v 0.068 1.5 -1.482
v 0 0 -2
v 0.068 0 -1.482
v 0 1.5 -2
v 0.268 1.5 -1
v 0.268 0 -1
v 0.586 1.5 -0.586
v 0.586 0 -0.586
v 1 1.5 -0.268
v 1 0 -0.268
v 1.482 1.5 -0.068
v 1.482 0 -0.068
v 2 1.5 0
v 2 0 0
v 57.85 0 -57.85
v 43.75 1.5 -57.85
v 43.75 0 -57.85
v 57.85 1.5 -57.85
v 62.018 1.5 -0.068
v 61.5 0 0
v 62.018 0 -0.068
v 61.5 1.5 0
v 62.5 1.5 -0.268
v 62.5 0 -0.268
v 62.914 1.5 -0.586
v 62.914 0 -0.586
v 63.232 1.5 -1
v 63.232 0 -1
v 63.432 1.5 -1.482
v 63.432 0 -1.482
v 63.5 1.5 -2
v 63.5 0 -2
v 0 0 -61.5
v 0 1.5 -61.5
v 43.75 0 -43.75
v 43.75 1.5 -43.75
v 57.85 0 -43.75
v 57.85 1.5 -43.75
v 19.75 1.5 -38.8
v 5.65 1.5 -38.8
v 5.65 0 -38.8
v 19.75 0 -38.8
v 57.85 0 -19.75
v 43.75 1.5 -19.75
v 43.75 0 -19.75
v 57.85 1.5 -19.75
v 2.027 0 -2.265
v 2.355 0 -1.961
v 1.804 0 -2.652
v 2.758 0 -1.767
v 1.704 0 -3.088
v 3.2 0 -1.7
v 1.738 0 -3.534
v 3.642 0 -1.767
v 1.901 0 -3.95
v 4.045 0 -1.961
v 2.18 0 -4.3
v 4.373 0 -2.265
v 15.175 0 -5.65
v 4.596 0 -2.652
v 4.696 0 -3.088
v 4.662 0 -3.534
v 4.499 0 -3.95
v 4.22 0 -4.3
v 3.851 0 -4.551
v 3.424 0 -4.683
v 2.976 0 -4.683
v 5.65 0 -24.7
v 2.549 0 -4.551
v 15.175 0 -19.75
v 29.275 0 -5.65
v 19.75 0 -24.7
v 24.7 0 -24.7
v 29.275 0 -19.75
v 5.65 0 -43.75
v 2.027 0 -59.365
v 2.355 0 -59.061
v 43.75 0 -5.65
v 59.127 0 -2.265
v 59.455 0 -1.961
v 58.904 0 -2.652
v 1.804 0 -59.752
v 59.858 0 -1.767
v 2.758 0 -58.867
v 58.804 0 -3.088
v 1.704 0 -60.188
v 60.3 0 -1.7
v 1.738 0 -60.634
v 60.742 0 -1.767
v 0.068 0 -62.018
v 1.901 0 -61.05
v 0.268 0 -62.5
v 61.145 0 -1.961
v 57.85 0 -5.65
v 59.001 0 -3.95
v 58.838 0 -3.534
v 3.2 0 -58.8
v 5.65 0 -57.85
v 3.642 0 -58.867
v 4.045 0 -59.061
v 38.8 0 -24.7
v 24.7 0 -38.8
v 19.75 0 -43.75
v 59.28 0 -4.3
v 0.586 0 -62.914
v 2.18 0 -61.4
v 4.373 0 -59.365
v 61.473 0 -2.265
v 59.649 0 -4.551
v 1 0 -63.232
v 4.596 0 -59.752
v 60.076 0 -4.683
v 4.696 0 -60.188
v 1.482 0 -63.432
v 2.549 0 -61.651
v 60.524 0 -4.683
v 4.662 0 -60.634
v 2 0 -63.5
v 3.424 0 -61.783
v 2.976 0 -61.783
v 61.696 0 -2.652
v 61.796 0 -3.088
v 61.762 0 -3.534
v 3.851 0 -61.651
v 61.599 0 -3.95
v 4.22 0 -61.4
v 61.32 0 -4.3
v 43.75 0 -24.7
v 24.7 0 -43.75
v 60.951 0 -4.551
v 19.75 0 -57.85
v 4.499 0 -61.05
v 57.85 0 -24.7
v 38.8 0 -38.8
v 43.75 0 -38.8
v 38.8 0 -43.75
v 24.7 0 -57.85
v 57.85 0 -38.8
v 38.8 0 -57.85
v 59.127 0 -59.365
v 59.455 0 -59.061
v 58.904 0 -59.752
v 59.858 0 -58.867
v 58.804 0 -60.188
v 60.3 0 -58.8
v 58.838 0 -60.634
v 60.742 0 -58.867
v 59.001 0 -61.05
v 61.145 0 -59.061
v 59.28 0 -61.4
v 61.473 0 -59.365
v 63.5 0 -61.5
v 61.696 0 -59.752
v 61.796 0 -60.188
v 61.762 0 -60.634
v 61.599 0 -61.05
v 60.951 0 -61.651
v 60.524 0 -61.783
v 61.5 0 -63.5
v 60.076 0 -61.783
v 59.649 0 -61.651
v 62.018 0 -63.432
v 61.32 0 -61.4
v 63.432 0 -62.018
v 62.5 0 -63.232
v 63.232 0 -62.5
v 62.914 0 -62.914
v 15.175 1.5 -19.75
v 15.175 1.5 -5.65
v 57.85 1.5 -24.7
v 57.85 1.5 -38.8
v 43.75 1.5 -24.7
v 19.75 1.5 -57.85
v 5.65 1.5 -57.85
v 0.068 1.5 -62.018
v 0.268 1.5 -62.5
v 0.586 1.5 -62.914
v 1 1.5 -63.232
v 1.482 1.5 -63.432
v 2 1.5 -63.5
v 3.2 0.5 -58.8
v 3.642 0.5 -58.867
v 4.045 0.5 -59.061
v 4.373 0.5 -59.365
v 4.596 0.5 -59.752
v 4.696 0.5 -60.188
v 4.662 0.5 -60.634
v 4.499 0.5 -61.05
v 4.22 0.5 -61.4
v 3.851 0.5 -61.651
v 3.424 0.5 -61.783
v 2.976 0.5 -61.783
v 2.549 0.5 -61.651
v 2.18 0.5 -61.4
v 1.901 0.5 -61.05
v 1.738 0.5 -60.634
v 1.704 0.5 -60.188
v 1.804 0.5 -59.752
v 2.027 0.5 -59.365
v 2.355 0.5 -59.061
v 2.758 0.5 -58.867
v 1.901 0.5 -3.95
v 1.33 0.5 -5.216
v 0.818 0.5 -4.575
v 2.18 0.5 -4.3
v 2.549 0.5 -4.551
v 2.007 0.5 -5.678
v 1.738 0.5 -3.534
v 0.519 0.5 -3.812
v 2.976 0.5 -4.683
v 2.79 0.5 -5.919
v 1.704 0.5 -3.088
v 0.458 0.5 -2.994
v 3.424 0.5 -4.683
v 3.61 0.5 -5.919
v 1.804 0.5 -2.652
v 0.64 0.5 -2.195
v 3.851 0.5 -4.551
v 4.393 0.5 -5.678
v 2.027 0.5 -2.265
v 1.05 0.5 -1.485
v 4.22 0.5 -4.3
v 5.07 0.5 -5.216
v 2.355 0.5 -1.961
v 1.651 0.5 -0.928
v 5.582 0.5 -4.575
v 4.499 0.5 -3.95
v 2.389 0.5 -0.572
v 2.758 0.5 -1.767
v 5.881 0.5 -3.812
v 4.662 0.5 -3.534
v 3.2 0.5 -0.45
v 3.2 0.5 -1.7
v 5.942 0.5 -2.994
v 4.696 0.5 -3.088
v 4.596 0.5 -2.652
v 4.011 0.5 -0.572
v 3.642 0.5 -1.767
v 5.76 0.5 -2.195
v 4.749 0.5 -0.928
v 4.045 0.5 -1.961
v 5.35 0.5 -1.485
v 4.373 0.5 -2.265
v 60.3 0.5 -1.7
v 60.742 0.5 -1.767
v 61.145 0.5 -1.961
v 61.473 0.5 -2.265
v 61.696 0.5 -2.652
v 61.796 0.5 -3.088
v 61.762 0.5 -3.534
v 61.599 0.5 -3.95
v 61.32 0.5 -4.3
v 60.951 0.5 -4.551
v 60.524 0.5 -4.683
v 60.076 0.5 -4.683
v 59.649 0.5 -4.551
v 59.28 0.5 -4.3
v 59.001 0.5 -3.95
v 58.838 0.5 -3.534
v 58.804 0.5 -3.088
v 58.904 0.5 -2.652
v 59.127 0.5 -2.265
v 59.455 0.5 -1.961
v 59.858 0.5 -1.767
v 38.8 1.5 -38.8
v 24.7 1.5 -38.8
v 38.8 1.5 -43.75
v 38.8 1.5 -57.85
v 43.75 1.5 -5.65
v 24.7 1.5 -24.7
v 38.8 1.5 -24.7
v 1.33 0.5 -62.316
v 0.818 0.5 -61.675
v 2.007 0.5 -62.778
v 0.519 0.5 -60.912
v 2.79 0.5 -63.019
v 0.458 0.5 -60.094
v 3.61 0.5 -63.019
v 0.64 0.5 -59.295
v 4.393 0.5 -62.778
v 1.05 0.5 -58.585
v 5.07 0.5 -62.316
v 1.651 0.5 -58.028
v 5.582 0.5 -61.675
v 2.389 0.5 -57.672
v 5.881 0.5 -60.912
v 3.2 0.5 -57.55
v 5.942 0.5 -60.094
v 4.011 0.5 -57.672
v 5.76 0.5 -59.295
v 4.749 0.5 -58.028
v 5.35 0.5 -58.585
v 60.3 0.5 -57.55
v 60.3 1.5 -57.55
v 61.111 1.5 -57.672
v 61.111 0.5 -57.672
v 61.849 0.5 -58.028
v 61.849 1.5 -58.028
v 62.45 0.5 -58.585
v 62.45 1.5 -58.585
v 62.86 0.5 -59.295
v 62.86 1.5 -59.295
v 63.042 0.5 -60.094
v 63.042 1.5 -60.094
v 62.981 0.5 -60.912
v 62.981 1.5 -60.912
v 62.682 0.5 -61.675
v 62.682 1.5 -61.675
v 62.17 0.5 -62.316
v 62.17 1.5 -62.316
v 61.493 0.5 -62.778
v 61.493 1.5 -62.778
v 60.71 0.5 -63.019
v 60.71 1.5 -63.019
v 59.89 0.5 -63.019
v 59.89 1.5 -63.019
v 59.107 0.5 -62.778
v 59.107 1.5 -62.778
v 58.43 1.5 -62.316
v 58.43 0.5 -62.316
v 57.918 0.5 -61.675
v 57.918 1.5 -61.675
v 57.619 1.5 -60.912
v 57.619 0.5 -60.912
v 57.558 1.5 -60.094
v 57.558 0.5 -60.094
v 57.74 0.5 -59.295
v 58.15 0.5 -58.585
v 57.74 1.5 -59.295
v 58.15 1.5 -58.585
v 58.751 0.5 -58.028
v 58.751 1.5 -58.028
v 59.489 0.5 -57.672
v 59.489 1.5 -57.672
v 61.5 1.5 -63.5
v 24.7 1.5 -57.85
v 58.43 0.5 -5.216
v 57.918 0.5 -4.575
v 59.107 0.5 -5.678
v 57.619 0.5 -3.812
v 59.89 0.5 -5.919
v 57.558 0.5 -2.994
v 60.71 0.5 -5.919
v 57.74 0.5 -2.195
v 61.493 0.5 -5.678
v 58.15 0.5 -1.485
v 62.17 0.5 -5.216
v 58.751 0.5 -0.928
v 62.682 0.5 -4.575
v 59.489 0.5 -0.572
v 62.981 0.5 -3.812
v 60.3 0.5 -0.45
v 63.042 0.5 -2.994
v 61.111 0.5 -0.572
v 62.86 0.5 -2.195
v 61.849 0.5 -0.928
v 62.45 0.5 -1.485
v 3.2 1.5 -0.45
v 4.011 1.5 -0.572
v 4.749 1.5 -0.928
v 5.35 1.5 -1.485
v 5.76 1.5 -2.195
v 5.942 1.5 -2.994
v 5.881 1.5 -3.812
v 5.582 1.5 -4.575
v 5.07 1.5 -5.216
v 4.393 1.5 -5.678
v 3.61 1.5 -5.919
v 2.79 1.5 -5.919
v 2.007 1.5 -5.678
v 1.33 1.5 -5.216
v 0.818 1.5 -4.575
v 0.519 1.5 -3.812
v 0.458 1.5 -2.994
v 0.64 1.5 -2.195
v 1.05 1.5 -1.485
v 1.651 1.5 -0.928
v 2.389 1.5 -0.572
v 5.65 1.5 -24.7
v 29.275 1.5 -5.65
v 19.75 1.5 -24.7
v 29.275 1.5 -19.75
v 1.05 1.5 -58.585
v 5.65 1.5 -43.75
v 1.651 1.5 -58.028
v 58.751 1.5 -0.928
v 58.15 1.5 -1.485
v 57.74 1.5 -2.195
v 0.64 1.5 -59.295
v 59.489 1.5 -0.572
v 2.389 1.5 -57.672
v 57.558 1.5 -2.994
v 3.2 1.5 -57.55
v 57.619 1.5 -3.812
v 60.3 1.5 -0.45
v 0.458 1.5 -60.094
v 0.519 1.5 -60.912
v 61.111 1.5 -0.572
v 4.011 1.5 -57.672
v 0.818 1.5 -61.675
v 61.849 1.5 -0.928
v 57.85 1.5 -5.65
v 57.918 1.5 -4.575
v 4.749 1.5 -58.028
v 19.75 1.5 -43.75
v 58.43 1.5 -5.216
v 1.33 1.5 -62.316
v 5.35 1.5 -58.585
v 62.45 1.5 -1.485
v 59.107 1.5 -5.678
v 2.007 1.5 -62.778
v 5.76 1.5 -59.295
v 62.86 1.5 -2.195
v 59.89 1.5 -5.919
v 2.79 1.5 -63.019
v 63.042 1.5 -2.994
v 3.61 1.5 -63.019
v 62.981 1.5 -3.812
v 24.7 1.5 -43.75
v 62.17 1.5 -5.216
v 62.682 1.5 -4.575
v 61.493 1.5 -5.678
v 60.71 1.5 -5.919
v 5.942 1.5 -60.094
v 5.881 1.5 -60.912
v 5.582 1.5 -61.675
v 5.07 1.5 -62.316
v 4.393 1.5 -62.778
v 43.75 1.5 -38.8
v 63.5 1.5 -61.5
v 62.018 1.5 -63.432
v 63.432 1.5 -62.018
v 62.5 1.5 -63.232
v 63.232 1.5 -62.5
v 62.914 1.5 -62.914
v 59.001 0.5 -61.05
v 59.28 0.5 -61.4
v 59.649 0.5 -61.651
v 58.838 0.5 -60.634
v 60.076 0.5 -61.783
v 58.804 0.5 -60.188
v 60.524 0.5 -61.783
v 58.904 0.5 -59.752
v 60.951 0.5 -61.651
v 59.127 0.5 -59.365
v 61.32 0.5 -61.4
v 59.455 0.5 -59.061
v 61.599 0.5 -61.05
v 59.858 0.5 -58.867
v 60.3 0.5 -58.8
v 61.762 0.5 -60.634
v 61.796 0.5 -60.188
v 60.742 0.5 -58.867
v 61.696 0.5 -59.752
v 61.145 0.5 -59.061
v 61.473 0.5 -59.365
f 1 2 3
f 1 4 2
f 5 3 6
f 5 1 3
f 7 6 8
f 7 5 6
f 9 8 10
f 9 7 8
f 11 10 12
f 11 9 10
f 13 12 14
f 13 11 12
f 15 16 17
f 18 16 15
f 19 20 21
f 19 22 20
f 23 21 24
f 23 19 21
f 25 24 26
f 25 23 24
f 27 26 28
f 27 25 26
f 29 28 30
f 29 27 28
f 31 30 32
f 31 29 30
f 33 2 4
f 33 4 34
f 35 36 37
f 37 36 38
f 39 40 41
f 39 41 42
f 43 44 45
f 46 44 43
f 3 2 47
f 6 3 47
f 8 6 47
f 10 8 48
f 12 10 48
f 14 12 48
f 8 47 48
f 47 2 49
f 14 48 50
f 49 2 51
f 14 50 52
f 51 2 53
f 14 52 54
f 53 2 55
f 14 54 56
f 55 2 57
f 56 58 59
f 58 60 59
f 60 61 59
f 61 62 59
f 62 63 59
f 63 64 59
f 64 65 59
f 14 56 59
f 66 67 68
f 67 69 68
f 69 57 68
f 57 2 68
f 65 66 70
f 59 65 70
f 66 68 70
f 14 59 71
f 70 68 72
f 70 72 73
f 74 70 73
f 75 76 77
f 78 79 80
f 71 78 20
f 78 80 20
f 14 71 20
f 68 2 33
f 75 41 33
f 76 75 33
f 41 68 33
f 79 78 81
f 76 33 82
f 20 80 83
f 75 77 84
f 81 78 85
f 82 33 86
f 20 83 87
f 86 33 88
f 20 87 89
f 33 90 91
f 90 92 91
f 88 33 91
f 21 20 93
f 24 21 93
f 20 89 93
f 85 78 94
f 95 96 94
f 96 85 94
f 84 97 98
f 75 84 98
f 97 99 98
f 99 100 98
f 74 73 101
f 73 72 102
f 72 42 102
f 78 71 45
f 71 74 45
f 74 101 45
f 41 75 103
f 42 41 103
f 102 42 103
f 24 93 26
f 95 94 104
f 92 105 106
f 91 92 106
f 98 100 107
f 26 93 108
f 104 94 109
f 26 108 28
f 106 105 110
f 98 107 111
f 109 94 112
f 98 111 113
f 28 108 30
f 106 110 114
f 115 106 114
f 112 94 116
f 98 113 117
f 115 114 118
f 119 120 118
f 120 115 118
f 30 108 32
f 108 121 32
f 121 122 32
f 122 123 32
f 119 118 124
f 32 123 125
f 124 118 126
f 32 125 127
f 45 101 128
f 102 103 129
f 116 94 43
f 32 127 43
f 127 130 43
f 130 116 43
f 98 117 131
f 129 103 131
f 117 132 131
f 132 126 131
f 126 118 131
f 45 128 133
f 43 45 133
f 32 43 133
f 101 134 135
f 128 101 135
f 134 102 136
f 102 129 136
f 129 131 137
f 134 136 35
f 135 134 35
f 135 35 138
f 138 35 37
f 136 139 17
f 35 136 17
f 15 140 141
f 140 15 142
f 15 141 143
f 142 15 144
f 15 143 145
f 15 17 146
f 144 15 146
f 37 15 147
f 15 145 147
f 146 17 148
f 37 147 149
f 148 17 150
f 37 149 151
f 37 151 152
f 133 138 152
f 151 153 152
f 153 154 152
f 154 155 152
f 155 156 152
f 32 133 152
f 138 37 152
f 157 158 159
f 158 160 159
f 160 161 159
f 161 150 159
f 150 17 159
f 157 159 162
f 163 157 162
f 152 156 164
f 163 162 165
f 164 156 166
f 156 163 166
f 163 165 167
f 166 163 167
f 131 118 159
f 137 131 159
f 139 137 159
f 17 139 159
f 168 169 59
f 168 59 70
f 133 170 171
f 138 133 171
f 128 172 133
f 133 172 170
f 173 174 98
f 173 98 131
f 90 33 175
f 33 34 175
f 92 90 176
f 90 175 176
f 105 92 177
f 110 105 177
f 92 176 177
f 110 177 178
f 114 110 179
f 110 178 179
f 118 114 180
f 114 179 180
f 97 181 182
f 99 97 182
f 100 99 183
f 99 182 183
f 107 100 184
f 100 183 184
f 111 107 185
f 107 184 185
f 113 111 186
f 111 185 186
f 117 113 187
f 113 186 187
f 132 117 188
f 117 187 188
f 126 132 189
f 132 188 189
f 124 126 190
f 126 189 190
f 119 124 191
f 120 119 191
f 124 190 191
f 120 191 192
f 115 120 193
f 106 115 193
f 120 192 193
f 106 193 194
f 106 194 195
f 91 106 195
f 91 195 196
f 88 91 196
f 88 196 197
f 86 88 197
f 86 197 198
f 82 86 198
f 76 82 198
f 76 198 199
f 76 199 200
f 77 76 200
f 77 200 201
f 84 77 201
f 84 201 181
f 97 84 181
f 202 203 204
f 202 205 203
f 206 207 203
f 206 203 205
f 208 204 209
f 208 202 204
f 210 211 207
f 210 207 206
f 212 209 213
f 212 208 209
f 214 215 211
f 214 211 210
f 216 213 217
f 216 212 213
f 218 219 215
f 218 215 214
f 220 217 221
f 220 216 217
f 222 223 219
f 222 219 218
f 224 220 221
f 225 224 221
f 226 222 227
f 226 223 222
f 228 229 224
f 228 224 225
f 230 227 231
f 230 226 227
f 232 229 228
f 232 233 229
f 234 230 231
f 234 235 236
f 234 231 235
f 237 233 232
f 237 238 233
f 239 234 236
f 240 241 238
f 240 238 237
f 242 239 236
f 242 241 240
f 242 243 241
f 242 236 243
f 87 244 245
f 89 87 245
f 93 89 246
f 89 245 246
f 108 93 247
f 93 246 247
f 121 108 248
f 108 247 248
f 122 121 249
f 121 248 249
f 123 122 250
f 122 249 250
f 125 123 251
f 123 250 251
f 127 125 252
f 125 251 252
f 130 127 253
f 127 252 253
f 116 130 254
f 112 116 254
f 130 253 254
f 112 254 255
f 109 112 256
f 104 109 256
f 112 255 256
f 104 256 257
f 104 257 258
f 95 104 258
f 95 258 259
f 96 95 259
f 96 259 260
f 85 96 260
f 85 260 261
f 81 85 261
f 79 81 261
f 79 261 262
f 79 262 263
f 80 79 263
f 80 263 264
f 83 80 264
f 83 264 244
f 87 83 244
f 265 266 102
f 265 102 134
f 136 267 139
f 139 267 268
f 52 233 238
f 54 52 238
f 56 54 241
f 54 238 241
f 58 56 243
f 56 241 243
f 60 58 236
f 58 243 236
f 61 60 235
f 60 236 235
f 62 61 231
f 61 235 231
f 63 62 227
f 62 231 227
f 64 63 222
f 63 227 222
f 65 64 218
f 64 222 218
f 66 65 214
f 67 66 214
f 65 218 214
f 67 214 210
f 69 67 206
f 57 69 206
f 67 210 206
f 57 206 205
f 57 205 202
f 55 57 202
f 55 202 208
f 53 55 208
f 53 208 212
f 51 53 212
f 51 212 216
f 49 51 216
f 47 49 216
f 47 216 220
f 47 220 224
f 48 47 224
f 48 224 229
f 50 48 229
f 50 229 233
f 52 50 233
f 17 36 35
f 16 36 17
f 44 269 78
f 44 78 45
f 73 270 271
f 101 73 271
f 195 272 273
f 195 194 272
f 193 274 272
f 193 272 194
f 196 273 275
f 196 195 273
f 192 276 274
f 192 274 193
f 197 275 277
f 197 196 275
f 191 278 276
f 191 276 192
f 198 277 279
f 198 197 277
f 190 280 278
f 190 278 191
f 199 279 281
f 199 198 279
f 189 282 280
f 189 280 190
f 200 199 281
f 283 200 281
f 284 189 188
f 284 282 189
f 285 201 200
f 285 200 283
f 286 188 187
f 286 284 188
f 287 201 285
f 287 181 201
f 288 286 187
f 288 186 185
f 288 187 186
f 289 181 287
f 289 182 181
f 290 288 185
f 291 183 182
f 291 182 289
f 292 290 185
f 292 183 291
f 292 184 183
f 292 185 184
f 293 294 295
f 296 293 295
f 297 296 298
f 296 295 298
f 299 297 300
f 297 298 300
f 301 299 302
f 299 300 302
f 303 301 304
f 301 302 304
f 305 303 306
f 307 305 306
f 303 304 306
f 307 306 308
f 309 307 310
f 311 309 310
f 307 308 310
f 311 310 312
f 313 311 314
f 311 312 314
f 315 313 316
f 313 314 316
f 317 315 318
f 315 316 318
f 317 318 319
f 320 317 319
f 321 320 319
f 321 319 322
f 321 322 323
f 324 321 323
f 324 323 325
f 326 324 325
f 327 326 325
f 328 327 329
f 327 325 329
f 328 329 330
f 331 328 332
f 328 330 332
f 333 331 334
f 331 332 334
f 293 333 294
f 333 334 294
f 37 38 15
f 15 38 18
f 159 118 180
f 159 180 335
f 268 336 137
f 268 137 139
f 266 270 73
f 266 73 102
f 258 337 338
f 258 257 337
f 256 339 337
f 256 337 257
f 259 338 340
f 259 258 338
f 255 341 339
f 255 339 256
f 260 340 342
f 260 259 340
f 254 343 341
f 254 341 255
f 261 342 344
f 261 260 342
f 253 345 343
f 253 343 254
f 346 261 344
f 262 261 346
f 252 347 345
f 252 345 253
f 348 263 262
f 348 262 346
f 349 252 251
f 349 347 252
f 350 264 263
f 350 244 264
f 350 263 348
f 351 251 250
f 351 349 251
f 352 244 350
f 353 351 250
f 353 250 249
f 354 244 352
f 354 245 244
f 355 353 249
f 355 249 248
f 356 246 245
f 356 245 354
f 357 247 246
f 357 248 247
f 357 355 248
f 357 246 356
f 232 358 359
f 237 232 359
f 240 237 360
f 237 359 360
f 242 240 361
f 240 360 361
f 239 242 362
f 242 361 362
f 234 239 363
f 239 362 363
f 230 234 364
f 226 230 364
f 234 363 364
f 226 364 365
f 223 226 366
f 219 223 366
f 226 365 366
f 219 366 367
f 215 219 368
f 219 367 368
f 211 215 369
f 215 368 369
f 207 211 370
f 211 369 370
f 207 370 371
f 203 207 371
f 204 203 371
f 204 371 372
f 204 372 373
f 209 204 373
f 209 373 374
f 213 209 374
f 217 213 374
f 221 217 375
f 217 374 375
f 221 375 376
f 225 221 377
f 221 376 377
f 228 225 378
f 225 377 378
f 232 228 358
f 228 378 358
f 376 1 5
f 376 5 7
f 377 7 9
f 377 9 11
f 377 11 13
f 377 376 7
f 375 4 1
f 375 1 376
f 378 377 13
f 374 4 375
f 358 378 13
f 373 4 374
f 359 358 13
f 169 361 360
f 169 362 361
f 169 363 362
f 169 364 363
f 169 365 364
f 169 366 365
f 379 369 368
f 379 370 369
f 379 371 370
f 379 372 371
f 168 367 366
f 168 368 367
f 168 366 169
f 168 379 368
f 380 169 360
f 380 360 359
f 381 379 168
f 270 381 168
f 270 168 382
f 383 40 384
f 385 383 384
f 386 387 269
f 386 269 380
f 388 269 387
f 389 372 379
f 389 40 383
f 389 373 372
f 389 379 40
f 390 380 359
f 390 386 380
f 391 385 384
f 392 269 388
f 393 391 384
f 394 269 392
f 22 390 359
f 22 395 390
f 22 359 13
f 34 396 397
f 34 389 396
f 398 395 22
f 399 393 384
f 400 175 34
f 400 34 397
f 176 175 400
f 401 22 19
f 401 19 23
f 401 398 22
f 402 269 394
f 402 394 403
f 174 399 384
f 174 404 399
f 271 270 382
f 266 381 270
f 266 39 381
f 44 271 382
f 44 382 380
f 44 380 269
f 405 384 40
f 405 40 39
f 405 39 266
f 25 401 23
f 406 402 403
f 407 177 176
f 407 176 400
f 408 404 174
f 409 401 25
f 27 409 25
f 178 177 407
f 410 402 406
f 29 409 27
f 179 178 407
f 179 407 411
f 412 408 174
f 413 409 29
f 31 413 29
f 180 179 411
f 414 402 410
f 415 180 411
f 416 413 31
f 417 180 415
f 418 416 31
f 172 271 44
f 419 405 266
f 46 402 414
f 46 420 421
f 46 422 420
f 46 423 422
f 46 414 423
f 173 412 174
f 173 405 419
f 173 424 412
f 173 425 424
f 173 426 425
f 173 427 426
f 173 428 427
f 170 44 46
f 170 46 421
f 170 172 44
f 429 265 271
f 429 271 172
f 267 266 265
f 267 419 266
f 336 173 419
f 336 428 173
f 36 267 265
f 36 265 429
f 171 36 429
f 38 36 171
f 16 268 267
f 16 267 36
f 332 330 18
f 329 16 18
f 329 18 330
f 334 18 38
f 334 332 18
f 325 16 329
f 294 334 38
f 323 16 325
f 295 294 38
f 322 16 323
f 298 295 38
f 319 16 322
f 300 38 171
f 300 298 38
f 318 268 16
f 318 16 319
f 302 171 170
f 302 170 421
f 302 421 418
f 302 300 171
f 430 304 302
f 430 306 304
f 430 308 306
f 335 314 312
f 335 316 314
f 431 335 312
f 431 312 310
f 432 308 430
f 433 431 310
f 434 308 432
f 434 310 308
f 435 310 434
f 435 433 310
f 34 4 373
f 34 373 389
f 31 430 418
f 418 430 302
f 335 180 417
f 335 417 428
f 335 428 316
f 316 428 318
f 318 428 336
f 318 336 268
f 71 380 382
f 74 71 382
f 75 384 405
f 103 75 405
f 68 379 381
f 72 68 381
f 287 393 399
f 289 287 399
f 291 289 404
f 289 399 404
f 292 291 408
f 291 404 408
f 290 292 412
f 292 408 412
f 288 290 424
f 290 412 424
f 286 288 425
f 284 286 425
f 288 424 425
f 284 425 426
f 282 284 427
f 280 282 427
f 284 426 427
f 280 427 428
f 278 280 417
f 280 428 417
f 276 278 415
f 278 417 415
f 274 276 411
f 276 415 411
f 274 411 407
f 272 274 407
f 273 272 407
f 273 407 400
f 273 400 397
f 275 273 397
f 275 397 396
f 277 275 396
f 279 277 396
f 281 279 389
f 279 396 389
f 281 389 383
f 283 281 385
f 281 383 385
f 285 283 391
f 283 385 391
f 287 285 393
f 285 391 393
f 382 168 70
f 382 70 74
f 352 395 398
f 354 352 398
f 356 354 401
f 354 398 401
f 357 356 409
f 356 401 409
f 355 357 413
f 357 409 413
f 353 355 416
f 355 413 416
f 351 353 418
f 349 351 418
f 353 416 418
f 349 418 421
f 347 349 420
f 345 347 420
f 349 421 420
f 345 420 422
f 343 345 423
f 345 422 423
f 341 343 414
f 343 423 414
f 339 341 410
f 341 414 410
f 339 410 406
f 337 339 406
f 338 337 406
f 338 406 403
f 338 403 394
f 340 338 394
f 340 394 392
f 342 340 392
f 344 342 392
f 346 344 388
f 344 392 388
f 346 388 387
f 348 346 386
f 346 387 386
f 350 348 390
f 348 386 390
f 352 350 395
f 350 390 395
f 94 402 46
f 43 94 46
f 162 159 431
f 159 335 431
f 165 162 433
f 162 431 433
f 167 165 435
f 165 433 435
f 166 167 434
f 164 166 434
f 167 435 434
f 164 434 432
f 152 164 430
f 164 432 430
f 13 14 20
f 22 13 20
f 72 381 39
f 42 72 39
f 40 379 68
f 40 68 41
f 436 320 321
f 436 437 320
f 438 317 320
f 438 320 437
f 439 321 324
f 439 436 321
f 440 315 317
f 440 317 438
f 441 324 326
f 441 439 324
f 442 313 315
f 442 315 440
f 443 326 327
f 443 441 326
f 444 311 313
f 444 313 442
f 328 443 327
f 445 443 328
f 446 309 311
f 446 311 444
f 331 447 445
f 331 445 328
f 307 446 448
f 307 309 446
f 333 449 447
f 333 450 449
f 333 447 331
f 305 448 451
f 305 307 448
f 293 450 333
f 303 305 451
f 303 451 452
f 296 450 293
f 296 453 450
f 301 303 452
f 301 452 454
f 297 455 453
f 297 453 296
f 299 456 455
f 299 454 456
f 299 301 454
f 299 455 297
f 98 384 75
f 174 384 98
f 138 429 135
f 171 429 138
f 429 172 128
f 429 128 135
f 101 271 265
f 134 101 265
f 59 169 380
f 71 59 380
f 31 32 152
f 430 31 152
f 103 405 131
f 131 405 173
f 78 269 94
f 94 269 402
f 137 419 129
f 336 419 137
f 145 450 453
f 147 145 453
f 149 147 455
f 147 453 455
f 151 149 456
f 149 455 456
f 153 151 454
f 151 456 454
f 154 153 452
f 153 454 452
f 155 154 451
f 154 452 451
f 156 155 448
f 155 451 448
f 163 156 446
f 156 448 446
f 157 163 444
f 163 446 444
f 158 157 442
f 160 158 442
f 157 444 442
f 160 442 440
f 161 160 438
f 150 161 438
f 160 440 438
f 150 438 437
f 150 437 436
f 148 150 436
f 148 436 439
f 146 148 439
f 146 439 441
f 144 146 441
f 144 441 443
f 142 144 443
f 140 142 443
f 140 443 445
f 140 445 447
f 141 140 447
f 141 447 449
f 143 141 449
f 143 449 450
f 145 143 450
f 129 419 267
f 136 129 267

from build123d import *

# Parameters (mm, degrees)
SKETCH1_W           = 63.5
SKETCH1_H           = 63.5
BOSS_EXTRUDE1_DEPTH = 1.5
SKETCH2_R           = 1.5
SKETCH2_W           = 14.1
SKETCH2_H           = 14.1
CUT_EXTRUDE1_DEPTH  = 90.815087819
SKETCH4_R           = 2.75
CUT_EXTRUDE2_DEPTH  = 1
FILLET1_R           = 2


with BuildPart() as part:
    # Sketch1 → Boss-Extrude1 (new body)
    with BuildSketch(Plane(origin=(0, 0, 0), x_dir=(1, 0, 0), z_dir=(0, 1, 0))):
        with Locations((31.75, 31.75)):
            Rectangle(SKETCH1_W, SKETCH1_H)
    extrude(amount=BOSS_EXTRUDE1_DEPTH)

    # Sketch2 → Cut-Extrude1 (cut, through all)
    with BuildSketch(Plane(origin=(0, 1.5, 0), x_dir=(1, 0, 0), z_dir=(0, 1, 0))):
        with Locations(Location((3.2, 60.3, 0), (0, 0, 270))):
            Circle(SKETCH2_R)
        with Locations(Location((60.3, 60.3, 0), (0, 0, 270))):
            Circle(SKETCH2_R)
        with Locations(Location((60.3, 3.2, 0), (0, 0, 270))):
            Circle(SKETCH2_R)
        with Locations(Location((3.2, 3.2, 0), (0, 0, 270))):
            Circle(SKETCH2_R)
        with Locations((12.7, 50.8)):
            Rectangle(SKETCH2_W, SKETCH2_H)
        with Locations((31.75, 50.8)):
            Rectangle(SKETCH2_W, SKETCH2_H)
        with Locations((50.8, 50.8)):
            Rectangle(SKETCH2_W, SKETCH2_H)
        with Locations((12.7, 31.75)):
            Rectangle(SKETCH2_W, SKETCH2_H)
        with Locations((31.75, 31.75)):
            Rectangle(SKETCH2_W, SKETCH2_H)
        with Locations((50.8, 31.75)):
            Rectangle(SKETCH2_W, SKETCH2_H)
        with Locations((22.225, 12.7)):
            Rectangle(SKETCH2_W, SKETCH2_H)
        with Locations((50.8, 12.7)):
            Rectangle(SKETCH2_W, SKETCH2_H)
    extrude(amount=-CUT_EXTRUDE1_DEPTH, mode=Mode.SUBTRACT)

    # Sketch4 → Cut-Extrude2 (cut)
    with BuildSketch(Plane(origin=(0, 1.5, 0), x_dir=(1, 0, 0), z_dir=(0, 1, 0))):
        with Locations(Location((3.2, 60.3, 0), (0, 0, 270))):
            Circle(SKETCH4_R)
        with Locations(Location((60.3, 60.3, 0), (0, 0, 270))):
            Circle(SKETCH4_R)
        with Locations(Location((60.3, 3.2, 0), (0, 0, 270))):
            Circle(SKETCH4_R)
        with Locations(Location((3.2, 3.2, 0), (0, 0, 270))):
            Circle(SKETCH4_R)
    extrude(amount=-CUT_EXTRUDE2_DEPTH, mode=Mode.SUBTRACT)

    # Fillet1
    fillet1_edges = [part.edges().sort_by_distance(p)[0] for p in [
        (0, 0.75, -63.5),
        (63.5, 0.75, -63.5),
        (63.5, 0.75, 0),
        (0, 0.75, 0),
    ]]
    fillet(fillet1_edges, radius=FILLET1_R)


solid = part.part
